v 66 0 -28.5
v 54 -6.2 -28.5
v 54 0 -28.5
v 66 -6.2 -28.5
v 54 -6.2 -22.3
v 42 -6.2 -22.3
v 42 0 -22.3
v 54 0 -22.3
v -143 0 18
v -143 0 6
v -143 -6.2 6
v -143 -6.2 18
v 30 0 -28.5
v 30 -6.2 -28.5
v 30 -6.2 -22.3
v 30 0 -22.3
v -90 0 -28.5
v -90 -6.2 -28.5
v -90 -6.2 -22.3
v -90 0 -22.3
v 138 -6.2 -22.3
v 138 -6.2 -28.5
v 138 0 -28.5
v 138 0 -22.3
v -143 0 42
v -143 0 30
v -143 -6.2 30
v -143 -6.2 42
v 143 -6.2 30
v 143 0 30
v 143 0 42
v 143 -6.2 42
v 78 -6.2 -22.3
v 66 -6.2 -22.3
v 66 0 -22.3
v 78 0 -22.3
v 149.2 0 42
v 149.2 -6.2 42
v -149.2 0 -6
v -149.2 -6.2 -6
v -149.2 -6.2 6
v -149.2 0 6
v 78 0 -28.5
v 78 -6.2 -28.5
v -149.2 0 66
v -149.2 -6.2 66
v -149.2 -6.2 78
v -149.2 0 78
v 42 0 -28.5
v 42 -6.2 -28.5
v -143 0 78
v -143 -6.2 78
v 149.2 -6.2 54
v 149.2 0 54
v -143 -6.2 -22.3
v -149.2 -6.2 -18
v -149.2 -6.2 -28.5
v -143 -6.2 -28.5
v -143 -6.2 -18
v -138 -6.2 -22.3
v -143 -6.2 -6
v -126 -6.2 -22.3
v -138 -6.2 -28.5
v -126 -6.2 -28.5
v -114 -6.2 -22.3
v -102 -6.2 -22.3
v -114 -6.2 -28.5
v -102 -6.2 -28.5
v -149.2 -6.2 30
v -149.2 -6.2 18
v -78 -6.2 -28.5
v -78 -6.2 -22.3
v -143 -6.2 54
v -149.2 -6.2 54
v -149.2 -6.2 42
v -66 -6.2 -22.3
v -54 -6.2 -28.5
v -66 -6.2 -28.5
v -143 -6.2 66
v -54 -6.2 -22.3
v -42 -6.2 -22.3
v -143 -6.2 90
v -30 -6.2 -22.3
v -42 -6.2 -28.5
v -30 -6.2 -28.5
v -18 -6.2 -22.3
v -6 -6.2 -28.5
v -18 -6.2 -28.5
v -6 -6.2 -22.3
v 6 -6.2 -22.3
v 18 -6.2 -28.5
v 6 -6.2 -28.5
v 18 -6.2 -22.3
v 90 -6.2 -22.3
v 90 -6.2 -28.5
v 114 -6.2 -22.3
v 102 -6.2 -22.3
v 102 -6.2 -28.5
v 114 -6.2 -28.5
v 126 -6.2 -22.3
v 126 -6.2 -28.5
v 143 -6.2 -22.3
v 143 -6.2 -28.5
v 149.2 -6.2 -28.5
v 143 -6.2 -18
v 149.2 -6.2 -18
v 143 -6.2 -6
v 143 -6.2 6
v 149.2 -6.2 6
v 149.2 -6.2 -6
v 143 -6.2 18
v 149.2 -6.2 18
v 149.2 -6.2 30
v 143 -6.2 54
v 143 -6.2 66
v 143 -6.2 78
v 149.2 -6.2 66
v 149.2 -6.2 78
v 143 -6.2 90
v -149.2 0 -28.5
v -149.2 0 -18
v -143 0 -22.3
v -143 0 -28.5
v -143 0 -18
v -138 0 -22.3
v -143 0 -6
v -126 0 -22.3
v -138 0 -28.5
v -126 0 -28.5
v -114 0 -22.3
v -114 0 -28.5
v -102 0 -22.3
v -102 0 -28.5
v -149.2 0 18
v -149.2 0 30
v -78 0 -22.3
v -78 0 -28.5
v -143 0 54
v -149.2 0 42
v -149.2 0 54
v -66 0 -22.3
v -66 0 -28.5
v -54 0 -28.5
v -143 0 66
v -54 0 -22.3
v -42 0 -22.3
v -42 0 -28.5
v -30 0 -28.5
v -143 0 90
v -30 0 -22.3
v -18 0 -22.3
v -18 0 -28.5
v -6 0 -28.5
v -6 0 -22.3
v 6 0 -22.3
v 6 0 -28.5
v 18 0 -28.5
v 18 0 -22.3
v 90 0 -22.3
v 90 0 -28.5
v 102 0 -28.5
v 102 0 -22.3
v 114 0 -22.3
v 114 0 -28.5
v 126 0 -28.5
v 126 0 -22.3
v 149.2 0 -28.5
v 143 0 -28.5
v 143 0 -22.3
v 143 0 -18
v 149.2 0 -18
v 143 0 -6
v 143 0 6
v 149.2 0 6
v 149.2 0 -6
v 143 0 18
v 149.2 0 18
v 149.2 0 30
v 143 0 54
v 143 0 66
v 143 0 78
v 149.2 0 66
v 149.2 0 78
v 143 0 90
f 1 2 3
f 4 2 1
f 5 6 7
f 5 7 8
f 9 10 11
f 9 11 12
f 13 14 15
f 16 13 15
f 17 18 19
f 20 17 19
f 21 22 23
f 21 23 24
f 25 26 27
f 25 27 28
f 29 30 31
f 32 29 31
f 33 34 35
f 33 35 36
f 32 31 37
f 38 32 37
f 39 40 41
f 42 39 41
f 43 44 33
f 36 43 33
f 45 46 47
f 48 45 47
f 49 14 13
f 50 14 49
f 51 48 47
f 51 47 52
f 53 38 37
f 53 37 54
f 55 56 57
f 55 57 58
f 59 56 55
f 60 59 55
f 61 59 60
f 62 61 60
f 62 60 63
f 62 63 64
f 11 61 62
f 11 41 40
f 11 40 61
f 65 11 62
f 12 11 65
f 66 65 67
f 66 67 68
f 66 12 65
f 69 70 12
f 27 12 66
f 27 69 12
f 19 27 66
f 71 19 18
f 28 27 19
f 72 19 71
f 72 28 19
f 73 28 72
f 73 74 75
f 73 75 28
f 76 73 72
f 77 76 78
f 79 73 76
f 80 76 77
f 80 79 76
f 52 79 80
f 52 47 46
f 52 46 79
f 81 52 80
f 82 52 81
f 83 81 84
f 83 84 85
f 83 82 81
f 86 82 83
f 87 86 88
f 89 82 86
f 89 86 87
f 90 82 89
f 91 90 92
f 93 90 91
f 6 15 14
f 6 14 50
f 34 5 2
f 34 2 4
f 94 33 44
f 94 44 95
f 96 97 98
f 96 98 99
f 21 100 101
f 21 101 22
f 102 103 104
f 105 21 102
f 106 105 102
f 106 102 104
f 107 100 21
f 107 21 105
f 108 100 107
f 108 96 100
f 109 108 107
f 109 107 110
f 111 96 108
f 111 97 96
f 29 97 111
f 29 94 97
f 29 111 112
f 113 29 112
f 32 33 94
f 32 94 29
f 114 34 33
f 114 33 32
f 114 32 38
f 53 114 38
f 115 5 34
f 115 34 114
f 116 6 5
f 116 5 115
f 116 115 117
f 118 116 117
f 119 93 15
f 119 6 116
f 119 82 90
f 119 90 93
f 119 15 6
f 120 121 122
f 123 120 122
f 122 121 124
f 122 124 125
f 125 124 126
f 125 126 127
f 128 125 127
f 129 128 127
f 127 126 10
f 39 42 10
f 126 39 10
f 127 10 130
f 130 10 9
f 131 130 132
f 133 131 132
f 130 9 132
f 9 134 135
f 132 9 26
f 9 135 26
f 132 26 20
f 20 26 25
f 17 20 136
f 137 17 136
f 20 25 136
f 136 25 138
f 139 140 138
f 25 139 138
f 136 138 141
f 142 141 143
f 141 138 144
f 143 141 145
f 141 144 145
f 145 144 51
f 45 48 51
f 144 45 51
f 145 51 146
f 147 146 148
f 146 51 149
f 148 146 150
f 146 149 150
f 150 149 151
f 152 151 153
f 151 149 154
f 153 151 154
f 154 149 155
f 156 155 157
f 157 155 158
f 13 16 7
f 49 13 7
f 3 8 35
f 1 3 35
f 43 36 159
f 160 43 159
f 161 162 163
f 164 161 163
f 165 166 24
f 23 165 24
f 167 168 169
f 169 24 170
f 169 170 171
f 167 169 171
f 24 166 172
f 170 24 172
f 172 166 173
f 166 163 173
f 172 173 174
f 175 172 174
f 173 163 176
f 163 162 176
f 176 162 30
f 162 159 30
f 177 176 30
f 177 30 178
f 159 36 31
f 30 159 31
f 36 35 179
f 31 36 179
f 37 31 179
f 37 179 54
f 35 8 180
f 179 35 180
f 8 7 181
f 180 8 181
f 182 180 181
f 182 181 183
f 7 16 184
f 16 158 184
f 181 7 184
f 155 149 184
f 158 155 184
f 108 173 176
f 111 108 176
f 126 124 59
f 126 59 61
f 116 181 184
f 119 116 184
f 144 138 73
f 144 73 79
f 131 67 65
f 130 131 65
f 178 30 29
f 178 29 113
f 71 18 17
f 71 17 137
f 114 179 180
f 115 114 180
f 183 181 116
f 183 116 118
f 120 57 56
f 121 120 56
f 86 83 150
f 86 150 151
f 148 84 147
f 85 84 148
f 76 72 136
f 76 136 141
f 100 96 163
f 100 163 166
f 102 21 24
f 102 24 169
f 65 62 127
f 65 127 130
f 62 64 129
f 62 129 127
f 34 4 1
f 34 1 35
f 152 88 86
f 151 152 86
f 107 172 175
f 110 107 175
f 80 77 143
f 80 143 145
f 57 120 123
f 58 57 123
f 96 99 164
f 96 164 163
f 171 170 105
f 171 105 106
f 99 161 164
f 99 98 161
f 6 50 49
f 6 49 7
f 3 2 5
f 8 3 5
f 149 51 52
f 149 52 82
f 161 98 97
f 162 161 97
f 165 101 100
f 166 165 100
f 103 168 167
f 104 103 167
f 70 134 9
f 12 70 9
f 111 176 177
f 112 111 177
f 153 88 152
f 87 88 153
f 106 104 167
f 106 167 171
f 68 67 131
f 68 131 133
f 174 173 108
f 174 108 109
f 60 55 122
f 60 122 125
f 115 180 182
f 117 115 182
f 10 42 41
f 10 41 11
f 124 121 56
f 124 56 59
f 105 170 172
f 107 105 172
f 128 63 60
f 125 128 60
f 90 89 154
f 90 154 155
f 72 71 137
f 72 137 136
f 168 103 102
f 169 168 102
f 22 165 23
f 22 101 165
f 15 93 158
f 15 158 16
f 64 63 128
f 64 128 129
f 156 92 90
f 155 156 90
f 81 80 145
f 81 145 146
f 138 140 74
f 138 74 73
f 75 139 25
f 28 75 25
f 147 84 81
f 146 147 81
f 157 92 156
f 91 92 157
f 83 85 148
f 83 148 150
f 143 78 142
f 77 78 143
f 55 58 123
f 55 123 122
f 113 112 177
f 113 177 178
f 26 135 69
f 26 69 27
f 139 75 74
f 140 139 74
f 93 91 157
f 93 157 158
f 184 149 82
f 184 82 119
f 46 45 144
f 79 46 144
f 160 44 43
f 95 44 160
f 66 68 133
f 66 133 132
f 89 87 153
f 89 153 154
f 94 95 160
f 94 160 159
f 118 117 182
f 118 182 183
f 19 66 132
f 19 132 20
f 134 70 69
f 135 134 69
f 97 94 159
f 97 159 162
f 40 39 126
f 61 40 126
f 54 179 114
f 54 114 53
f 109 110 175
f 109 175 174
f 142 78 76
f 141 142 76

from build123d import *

# Parameters (mm, degrees)
F0_W     = 286
F0_H     = 180
F1_DEPTH = 6.2
F2_W     = 12
F2_H     = 6.2
F2_W_2   = 5
F3_DEPTH = 6.201
F4_W     = 286
F4_H     = 61.5
F5_DEPTH = 6.201
F6_W     = 6.2
F6_H     = 12
F6_H_2   = 10.5
F7_DEPTH = 6.2


with BuildPart() as f1:
    # F0 (on Front) → F1 (new body)
    with BuildSketch(Plane.XZ):
        Rectangle(F0_W, F0_H)
    extrude(amount=F1_DEPTH)

    # F2 (on face) → F3 (cut, through all)
    with BuildSketch(Plane.XZ.offset(6.2)):
        with Locations((-120, -25.4)):
            Rectangle(F2_W, F2_H)
        with Locations((-96, -25.4)):
            Rectangle(F2_W, F2_H)
        with Locations((-72, -25.4)):
            Rectangle(F2_W, F2_H)
        with Locations((-48, -25.4)):
            Rectangle(F2_W, F2_H)
        with Locations((-24, -25.4)):
            Rectangle(F2_W, F2_H)
        with Locations((0, -25.4)):
            Rectangle(F2_W, F2_H)
        with Locations((24, -25.4)):
            Rectangle(F2_W, F2_H)
        with Locations((48, -25.4)):
            Rectangle(F2_W, F2_H)
        with Locations((72, -25.4)):
            Rectangle(F2_W, F2_H)
        with Locations((96, -25.4)):
            Rectangle(F2_W, F2_H)
        with Locations((120, -25.4)):
            Rectangle(F2_W, F2_H)
        with Locations((-140.5, -25.4)):
            Rectangle(F2_W_2, F2_H)
        with Locations((140.5, -25.4)):
            Rectangle(F2_W_2, F2_H)
    extrude(amount=-F3_DEPTH, mode=Mode.SUBTRACT)

    # F4 (on face) → F5 (cut, through all)
    with BuildSketch(Plane.XZ.offset(6.2)):
        with Locations((0, -59.25)):
            Rectangle(F4_W, F4_H)
    extrude(amount=-F5_DEPTH, mode=Mode.SUBTRACT)

    # F6 (on face) → F7 (join)
    with BuildSketch(Plane.XZ.offset(6.2)):
        with Locations((-146.1, 72)):
            Rectangle(F6_W, F6_H)
        with Locations((-146.1, 48)):
            Rectangle(F6_W, F6_H)
        with Locations((-146.1, 24)):
            Rectangle(F6_W, F6_H)
        with Locations((-146.1, 0)):
            Rectangle(F6_W, F6_H)
        with Locations((-146.1, -23.25)):
            Rectangle(F6_W, F6_H_2)
        with Locations((146.1, 48)):
            Rectangle(F6_W, F6_H)
        with Locations((146.1, 72)):
            Rectangle(F6_W, F6_H)
        with Locations((146.1, 24)):
            Rectangle(F6_W, F6_H)
        with Locations((146.1, 0)):
            Rectangle(F6_W, F6_H)
        with Locations((146.1, -23.25)):
            Rectangle(F6_W, F6_H_2)
    extrude(amount=-F7_DEPTH)


solid = f1.part
